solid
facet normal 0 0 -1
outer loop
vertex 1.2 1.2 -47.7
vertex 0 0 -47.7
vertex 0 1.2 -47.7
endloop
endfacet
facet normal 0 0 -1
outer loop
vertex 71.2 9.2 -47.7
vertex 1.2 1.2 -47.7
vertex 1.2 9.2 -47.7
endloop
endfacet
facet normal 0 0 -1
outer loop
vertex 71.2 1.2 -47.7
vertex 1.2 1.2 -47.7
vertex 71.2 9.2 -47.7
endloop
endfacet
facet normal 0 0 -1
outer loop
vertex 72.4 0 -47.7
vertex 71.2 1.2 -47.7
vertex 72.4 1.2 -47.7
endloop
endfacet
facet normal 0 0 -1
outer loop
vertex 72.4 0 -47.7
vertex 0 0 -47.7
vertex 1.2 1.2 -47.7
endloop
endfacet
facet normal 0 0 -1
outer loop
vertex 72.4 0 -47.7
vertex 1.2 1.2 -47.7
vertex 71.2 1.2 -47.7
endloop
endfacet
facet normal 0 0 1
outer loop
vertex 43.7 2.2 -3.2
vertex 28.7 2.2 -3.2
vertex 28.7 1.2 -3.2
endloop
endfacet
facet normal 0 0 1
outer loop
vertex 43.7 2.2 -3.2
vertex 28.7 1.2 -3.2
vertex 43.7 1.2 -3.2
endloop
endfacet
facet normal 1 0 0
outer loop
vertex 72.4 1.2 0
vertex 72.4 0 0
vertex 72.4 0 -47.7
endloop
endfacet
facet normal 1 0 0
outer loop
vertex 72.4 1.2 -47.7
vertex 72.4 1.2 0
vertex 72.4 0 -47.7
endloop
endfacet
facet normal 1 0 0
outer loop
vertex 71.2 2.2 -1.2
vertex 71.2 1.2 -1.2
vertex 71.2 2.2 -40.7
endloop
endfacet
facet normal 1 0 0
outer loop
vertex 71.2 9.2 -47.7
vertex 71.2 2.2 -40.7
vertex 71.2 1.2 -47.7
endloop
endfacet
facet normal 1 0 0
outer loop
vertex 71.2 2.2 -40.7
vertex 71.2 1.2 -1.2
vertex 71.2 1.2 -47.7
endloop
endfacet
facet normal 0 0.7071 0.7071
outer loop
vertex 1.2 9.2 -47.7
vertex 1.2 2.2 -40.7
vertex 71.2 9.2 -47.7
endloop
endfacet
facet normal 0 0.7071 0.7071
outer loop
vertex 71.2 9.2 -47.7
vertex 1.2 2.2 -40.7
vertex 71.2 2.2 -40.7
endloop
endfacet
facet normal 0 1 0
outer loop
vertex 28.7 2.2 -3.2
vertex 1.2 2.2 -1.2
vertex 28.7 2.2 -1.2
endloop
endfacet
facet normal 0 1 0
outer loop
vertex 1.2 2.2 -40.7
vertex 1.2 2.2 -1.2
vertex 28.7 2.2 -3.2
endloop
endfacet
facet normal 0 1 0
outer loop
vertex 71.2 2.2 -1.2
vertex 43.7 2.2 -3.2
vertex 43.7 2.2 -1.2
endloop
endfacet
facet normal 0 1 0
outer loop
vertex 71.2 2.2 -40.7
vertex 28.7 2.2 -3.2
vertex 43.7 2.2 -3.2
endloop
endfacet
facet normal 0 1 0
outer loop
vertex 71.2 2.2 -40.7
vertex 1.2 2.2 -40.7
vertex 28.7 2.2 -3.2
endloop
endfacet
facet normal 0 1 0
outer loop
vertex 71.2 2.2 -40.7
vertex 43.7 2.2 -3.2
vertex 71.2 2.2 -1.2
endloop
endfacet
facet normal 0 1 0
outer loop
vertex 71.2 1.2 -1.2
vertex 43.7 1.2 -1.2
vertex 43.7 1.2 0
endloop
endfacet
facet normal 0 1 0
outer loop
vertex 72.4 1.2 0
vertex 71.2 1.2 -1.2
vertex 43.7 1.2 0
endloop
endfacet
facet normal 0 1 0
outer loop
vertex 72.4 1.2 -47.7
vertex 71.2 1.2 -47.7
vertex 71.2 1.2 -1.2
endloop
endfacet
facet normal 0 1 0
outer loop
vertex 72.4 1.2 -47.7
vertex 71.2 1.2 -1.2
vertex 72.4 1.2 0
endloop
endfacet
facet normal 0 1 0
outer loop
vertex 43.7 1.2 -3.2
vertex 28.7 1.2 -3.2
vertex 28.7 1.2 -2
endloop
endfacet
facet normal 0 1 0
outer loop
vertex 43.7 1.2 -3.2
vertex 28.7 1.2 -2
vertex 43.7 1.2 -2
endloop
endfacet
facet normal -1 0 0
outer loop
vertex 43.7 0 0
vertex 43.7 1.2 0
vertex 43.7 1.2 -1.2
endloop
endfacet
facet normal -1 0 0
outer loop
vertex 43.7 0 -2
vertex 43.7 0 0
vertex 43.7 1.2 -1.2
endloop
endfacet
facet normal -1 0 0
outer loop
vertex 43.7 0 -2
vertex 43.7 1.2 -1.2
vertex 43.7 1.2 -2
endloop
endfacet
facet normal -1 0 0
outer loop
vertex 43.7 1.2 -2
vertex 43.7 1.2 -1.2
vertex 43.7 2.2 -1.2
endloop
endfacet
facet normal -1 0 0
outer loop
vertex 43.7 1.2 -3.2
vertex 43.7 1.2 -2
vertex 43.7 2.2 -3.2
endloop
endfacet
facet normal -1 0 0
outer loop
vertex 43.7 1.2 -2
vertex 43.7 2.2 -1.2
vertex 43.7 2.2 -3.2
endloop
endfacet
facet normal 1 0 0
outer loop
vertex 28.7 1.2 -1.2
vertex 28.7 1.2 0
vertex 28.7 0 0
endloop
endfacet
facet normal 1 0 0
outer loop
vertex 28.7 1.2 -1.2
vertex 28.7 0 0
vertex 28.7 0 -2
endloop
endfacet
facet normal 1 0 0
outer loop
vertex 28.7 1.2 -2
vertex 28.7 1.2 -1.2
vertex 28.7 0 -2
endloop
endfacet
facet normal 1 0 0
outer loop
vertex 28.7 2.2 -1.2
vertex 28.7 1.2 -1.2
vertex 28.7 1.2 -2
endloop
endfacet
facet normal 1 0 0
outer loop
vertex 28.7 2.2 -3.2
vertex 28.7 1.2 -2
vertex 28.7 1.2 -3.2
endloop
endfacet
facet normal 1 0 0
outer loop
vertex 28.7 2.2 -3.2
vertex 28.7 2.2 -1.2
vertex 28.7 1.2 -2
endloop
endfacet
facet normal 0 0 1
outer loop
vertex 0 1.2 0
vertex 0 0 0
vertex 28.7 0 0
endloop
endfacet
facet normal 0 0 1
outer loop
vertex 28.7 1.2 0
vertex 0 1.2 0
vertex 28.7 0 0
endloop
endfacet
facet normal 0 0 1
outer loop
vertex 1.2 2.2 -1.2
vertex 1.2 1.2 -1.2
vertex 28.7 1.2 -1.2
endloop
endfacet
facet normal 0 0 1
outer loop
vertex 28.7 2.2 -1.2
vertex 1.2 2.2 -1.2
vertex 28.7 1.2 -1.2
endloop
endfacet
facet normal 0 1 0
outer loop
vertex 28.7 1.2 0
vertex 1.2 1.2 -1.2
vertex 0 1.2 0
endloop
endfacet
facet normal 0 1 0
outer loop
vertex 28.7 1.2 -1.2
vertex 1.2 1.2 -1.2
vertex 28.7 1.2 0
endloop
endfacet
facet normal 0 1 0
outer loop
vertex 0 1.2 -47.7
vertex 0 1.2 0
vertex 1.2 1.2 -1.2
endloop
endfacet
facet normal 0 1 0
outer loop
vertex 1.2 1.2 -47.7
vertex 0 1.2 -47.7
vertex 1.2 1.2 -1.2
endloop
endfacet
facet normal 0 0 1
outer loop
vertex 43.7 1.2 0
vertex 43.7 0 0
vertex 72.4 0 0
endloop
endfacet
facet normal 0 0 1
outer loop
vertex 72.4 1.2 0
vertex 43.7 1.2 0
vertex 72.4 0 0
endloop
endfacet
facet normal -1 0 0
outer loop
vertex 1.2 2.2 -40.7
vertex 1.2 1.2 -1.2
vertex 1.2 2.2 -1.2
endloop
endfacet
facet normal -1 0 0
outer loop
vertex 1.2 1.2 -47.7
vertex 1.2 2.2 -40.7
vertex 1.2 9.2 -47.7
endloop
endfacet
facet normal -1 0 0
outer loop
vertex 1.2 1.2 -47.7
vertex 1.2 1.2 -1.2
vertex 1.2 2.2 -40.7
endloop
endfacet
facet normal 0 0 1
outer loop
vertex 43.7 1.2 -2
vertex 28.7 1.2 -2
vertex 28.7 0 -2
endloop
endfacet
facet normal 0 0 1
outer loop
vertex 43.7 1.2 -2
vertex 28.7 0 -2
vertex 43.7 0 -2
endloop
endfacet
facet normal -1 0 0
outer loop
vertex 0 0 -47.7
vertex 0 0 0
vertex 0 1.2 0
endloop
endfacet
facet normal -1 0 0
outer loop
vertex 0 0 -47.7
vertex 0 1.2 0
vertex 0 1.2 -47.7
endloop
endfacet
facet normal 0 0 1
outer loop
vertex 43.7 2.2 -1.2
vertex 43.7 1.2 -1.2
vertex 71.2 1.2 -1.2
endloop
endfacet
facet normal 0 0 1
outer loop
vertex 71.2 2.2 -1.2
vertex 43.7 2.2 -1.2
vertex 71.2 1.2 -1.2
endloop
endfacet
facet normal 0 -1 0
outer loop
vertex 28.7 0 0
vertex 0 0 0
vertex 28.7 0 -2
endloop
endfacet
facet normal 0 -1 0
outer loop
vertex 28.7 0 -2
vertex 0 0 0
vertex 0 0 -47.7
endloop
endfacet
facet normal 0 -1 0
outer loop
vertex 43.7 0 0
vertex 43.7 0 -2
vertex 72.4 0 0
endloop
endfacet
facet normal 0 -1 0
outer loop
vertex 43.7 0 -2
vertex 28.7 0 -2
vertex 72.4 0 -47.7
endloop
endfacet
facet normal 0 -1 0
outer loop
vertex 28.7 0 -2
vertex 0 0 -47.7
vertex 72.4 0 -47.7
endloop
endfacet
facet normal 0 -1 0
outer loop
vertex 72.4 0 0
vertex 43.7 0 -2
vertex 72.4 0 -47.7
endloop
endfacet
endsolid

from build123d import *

# Parameters (mm, degrees)
SKICA2_W                 = 72.4
SKICA2_H                 = 47.7
P_IDAT_VYSUNUT_M1_DEPTH  = 1.2
SKICA3_W                 = 70
SKICA3_H                 = 46.5
P_IDAT_VYSUNUT_M2_DEPTH  = 1
SKICA4_W                 = 70
SKICA4_H                 = 7
P_IDAT_VYSUNUT_M3_DEPTH  = 7
ZKOSEN_2_SIZE            = 7
SKICA5_W                 = 15
SKICA5_H                 = 2
ODEBRAT_VYSUNUT_M1_DEPTH = 10
SKICA6_W                 = 15
SKICA6_H                 = 1.2
ODEBRAT_VYSUNUT_M2_DEPTH = 1


with BuildPart() as part:
    # Skica2 → Přidat vysunutím1 (new body)
    with BuildSketch(Plane(origin=(0, 0, 0), x_dir=(1, 0, 0), z_dir=(0, 1, 0))):
        with Locations((36.2, 23.85)):
            Rectangle(SKICA2_W, SKICA2_H)
    extrude(amount=P_IDAT_VYSUNUT_M1_DEPTH)

    # Skica3 → Přidat vysunutím2 (add)
    with BuildSketch(Plane(origin=(0, 1.2, 0), x_dir=(1, 0, 0), z_dir=(0, 1, 0))):
        with Locations((36.2, 24.45)):
            Rectangle(SKICA3_W, SKICA3_H)
    extrude(amount=P_IDAT_VYSUNUT_M2_DEPTH)

    # Skica4 → Přidat vysunutím3 (add)
    with BuildSketch(Plane(origin=(0, 2.2, 0), x_dir=(1, 0, 0), z_dir=(0, 1, 0))):
        with Locations((36.2, 44.2)):
            Rectangle(SKICA4_W, SKICA4_H)
    extrude(amount=P_IDAT_VYSUNUT_M3_DEPTH)

    # Zkosení2
    zkosen_2_edges = [part.edges().sort_by_distance(p)[0] for p in [
        (36.2, 9.2, -40.7),
    ]]
    chamfer(zkosen_2_edges, length=ZKOSEN_2_SIZE - 0.0001)  # a hair under: the kernel refuses the full size

    # Skica5 → Odebrat vysunutím1 (cut)
    with BuildSketch(Plane(origin=(0, 2.2, 0), x_dir=(1, 0, 0), z_dir=(0, 1, 0))):
        with Locations((36.2, 1)):
            Rectangle(SKICA5_W, SKICA5_H)
    extrude(amount=-ODEBRAT_VYSUNUT_M1_DEPTH, mode=Mode.SUBTRACT)

    # Skica6 → Odebrat vysunutím2 (cut)
    with BuildSketch(Plane(origin=(0, 2.2, 0), x_dir=(1, 0, 0), z_dir=(0, 1, 0))):
        with Locations((36.2, 2.6)):
            Rectangle(SKICA6_W, SKICA6_H)
    extrude(amount=-ODEBRAT_VYSUNUT_M2_DEPTH, mode=Mode.SUBTRACT)


solid = part.part
